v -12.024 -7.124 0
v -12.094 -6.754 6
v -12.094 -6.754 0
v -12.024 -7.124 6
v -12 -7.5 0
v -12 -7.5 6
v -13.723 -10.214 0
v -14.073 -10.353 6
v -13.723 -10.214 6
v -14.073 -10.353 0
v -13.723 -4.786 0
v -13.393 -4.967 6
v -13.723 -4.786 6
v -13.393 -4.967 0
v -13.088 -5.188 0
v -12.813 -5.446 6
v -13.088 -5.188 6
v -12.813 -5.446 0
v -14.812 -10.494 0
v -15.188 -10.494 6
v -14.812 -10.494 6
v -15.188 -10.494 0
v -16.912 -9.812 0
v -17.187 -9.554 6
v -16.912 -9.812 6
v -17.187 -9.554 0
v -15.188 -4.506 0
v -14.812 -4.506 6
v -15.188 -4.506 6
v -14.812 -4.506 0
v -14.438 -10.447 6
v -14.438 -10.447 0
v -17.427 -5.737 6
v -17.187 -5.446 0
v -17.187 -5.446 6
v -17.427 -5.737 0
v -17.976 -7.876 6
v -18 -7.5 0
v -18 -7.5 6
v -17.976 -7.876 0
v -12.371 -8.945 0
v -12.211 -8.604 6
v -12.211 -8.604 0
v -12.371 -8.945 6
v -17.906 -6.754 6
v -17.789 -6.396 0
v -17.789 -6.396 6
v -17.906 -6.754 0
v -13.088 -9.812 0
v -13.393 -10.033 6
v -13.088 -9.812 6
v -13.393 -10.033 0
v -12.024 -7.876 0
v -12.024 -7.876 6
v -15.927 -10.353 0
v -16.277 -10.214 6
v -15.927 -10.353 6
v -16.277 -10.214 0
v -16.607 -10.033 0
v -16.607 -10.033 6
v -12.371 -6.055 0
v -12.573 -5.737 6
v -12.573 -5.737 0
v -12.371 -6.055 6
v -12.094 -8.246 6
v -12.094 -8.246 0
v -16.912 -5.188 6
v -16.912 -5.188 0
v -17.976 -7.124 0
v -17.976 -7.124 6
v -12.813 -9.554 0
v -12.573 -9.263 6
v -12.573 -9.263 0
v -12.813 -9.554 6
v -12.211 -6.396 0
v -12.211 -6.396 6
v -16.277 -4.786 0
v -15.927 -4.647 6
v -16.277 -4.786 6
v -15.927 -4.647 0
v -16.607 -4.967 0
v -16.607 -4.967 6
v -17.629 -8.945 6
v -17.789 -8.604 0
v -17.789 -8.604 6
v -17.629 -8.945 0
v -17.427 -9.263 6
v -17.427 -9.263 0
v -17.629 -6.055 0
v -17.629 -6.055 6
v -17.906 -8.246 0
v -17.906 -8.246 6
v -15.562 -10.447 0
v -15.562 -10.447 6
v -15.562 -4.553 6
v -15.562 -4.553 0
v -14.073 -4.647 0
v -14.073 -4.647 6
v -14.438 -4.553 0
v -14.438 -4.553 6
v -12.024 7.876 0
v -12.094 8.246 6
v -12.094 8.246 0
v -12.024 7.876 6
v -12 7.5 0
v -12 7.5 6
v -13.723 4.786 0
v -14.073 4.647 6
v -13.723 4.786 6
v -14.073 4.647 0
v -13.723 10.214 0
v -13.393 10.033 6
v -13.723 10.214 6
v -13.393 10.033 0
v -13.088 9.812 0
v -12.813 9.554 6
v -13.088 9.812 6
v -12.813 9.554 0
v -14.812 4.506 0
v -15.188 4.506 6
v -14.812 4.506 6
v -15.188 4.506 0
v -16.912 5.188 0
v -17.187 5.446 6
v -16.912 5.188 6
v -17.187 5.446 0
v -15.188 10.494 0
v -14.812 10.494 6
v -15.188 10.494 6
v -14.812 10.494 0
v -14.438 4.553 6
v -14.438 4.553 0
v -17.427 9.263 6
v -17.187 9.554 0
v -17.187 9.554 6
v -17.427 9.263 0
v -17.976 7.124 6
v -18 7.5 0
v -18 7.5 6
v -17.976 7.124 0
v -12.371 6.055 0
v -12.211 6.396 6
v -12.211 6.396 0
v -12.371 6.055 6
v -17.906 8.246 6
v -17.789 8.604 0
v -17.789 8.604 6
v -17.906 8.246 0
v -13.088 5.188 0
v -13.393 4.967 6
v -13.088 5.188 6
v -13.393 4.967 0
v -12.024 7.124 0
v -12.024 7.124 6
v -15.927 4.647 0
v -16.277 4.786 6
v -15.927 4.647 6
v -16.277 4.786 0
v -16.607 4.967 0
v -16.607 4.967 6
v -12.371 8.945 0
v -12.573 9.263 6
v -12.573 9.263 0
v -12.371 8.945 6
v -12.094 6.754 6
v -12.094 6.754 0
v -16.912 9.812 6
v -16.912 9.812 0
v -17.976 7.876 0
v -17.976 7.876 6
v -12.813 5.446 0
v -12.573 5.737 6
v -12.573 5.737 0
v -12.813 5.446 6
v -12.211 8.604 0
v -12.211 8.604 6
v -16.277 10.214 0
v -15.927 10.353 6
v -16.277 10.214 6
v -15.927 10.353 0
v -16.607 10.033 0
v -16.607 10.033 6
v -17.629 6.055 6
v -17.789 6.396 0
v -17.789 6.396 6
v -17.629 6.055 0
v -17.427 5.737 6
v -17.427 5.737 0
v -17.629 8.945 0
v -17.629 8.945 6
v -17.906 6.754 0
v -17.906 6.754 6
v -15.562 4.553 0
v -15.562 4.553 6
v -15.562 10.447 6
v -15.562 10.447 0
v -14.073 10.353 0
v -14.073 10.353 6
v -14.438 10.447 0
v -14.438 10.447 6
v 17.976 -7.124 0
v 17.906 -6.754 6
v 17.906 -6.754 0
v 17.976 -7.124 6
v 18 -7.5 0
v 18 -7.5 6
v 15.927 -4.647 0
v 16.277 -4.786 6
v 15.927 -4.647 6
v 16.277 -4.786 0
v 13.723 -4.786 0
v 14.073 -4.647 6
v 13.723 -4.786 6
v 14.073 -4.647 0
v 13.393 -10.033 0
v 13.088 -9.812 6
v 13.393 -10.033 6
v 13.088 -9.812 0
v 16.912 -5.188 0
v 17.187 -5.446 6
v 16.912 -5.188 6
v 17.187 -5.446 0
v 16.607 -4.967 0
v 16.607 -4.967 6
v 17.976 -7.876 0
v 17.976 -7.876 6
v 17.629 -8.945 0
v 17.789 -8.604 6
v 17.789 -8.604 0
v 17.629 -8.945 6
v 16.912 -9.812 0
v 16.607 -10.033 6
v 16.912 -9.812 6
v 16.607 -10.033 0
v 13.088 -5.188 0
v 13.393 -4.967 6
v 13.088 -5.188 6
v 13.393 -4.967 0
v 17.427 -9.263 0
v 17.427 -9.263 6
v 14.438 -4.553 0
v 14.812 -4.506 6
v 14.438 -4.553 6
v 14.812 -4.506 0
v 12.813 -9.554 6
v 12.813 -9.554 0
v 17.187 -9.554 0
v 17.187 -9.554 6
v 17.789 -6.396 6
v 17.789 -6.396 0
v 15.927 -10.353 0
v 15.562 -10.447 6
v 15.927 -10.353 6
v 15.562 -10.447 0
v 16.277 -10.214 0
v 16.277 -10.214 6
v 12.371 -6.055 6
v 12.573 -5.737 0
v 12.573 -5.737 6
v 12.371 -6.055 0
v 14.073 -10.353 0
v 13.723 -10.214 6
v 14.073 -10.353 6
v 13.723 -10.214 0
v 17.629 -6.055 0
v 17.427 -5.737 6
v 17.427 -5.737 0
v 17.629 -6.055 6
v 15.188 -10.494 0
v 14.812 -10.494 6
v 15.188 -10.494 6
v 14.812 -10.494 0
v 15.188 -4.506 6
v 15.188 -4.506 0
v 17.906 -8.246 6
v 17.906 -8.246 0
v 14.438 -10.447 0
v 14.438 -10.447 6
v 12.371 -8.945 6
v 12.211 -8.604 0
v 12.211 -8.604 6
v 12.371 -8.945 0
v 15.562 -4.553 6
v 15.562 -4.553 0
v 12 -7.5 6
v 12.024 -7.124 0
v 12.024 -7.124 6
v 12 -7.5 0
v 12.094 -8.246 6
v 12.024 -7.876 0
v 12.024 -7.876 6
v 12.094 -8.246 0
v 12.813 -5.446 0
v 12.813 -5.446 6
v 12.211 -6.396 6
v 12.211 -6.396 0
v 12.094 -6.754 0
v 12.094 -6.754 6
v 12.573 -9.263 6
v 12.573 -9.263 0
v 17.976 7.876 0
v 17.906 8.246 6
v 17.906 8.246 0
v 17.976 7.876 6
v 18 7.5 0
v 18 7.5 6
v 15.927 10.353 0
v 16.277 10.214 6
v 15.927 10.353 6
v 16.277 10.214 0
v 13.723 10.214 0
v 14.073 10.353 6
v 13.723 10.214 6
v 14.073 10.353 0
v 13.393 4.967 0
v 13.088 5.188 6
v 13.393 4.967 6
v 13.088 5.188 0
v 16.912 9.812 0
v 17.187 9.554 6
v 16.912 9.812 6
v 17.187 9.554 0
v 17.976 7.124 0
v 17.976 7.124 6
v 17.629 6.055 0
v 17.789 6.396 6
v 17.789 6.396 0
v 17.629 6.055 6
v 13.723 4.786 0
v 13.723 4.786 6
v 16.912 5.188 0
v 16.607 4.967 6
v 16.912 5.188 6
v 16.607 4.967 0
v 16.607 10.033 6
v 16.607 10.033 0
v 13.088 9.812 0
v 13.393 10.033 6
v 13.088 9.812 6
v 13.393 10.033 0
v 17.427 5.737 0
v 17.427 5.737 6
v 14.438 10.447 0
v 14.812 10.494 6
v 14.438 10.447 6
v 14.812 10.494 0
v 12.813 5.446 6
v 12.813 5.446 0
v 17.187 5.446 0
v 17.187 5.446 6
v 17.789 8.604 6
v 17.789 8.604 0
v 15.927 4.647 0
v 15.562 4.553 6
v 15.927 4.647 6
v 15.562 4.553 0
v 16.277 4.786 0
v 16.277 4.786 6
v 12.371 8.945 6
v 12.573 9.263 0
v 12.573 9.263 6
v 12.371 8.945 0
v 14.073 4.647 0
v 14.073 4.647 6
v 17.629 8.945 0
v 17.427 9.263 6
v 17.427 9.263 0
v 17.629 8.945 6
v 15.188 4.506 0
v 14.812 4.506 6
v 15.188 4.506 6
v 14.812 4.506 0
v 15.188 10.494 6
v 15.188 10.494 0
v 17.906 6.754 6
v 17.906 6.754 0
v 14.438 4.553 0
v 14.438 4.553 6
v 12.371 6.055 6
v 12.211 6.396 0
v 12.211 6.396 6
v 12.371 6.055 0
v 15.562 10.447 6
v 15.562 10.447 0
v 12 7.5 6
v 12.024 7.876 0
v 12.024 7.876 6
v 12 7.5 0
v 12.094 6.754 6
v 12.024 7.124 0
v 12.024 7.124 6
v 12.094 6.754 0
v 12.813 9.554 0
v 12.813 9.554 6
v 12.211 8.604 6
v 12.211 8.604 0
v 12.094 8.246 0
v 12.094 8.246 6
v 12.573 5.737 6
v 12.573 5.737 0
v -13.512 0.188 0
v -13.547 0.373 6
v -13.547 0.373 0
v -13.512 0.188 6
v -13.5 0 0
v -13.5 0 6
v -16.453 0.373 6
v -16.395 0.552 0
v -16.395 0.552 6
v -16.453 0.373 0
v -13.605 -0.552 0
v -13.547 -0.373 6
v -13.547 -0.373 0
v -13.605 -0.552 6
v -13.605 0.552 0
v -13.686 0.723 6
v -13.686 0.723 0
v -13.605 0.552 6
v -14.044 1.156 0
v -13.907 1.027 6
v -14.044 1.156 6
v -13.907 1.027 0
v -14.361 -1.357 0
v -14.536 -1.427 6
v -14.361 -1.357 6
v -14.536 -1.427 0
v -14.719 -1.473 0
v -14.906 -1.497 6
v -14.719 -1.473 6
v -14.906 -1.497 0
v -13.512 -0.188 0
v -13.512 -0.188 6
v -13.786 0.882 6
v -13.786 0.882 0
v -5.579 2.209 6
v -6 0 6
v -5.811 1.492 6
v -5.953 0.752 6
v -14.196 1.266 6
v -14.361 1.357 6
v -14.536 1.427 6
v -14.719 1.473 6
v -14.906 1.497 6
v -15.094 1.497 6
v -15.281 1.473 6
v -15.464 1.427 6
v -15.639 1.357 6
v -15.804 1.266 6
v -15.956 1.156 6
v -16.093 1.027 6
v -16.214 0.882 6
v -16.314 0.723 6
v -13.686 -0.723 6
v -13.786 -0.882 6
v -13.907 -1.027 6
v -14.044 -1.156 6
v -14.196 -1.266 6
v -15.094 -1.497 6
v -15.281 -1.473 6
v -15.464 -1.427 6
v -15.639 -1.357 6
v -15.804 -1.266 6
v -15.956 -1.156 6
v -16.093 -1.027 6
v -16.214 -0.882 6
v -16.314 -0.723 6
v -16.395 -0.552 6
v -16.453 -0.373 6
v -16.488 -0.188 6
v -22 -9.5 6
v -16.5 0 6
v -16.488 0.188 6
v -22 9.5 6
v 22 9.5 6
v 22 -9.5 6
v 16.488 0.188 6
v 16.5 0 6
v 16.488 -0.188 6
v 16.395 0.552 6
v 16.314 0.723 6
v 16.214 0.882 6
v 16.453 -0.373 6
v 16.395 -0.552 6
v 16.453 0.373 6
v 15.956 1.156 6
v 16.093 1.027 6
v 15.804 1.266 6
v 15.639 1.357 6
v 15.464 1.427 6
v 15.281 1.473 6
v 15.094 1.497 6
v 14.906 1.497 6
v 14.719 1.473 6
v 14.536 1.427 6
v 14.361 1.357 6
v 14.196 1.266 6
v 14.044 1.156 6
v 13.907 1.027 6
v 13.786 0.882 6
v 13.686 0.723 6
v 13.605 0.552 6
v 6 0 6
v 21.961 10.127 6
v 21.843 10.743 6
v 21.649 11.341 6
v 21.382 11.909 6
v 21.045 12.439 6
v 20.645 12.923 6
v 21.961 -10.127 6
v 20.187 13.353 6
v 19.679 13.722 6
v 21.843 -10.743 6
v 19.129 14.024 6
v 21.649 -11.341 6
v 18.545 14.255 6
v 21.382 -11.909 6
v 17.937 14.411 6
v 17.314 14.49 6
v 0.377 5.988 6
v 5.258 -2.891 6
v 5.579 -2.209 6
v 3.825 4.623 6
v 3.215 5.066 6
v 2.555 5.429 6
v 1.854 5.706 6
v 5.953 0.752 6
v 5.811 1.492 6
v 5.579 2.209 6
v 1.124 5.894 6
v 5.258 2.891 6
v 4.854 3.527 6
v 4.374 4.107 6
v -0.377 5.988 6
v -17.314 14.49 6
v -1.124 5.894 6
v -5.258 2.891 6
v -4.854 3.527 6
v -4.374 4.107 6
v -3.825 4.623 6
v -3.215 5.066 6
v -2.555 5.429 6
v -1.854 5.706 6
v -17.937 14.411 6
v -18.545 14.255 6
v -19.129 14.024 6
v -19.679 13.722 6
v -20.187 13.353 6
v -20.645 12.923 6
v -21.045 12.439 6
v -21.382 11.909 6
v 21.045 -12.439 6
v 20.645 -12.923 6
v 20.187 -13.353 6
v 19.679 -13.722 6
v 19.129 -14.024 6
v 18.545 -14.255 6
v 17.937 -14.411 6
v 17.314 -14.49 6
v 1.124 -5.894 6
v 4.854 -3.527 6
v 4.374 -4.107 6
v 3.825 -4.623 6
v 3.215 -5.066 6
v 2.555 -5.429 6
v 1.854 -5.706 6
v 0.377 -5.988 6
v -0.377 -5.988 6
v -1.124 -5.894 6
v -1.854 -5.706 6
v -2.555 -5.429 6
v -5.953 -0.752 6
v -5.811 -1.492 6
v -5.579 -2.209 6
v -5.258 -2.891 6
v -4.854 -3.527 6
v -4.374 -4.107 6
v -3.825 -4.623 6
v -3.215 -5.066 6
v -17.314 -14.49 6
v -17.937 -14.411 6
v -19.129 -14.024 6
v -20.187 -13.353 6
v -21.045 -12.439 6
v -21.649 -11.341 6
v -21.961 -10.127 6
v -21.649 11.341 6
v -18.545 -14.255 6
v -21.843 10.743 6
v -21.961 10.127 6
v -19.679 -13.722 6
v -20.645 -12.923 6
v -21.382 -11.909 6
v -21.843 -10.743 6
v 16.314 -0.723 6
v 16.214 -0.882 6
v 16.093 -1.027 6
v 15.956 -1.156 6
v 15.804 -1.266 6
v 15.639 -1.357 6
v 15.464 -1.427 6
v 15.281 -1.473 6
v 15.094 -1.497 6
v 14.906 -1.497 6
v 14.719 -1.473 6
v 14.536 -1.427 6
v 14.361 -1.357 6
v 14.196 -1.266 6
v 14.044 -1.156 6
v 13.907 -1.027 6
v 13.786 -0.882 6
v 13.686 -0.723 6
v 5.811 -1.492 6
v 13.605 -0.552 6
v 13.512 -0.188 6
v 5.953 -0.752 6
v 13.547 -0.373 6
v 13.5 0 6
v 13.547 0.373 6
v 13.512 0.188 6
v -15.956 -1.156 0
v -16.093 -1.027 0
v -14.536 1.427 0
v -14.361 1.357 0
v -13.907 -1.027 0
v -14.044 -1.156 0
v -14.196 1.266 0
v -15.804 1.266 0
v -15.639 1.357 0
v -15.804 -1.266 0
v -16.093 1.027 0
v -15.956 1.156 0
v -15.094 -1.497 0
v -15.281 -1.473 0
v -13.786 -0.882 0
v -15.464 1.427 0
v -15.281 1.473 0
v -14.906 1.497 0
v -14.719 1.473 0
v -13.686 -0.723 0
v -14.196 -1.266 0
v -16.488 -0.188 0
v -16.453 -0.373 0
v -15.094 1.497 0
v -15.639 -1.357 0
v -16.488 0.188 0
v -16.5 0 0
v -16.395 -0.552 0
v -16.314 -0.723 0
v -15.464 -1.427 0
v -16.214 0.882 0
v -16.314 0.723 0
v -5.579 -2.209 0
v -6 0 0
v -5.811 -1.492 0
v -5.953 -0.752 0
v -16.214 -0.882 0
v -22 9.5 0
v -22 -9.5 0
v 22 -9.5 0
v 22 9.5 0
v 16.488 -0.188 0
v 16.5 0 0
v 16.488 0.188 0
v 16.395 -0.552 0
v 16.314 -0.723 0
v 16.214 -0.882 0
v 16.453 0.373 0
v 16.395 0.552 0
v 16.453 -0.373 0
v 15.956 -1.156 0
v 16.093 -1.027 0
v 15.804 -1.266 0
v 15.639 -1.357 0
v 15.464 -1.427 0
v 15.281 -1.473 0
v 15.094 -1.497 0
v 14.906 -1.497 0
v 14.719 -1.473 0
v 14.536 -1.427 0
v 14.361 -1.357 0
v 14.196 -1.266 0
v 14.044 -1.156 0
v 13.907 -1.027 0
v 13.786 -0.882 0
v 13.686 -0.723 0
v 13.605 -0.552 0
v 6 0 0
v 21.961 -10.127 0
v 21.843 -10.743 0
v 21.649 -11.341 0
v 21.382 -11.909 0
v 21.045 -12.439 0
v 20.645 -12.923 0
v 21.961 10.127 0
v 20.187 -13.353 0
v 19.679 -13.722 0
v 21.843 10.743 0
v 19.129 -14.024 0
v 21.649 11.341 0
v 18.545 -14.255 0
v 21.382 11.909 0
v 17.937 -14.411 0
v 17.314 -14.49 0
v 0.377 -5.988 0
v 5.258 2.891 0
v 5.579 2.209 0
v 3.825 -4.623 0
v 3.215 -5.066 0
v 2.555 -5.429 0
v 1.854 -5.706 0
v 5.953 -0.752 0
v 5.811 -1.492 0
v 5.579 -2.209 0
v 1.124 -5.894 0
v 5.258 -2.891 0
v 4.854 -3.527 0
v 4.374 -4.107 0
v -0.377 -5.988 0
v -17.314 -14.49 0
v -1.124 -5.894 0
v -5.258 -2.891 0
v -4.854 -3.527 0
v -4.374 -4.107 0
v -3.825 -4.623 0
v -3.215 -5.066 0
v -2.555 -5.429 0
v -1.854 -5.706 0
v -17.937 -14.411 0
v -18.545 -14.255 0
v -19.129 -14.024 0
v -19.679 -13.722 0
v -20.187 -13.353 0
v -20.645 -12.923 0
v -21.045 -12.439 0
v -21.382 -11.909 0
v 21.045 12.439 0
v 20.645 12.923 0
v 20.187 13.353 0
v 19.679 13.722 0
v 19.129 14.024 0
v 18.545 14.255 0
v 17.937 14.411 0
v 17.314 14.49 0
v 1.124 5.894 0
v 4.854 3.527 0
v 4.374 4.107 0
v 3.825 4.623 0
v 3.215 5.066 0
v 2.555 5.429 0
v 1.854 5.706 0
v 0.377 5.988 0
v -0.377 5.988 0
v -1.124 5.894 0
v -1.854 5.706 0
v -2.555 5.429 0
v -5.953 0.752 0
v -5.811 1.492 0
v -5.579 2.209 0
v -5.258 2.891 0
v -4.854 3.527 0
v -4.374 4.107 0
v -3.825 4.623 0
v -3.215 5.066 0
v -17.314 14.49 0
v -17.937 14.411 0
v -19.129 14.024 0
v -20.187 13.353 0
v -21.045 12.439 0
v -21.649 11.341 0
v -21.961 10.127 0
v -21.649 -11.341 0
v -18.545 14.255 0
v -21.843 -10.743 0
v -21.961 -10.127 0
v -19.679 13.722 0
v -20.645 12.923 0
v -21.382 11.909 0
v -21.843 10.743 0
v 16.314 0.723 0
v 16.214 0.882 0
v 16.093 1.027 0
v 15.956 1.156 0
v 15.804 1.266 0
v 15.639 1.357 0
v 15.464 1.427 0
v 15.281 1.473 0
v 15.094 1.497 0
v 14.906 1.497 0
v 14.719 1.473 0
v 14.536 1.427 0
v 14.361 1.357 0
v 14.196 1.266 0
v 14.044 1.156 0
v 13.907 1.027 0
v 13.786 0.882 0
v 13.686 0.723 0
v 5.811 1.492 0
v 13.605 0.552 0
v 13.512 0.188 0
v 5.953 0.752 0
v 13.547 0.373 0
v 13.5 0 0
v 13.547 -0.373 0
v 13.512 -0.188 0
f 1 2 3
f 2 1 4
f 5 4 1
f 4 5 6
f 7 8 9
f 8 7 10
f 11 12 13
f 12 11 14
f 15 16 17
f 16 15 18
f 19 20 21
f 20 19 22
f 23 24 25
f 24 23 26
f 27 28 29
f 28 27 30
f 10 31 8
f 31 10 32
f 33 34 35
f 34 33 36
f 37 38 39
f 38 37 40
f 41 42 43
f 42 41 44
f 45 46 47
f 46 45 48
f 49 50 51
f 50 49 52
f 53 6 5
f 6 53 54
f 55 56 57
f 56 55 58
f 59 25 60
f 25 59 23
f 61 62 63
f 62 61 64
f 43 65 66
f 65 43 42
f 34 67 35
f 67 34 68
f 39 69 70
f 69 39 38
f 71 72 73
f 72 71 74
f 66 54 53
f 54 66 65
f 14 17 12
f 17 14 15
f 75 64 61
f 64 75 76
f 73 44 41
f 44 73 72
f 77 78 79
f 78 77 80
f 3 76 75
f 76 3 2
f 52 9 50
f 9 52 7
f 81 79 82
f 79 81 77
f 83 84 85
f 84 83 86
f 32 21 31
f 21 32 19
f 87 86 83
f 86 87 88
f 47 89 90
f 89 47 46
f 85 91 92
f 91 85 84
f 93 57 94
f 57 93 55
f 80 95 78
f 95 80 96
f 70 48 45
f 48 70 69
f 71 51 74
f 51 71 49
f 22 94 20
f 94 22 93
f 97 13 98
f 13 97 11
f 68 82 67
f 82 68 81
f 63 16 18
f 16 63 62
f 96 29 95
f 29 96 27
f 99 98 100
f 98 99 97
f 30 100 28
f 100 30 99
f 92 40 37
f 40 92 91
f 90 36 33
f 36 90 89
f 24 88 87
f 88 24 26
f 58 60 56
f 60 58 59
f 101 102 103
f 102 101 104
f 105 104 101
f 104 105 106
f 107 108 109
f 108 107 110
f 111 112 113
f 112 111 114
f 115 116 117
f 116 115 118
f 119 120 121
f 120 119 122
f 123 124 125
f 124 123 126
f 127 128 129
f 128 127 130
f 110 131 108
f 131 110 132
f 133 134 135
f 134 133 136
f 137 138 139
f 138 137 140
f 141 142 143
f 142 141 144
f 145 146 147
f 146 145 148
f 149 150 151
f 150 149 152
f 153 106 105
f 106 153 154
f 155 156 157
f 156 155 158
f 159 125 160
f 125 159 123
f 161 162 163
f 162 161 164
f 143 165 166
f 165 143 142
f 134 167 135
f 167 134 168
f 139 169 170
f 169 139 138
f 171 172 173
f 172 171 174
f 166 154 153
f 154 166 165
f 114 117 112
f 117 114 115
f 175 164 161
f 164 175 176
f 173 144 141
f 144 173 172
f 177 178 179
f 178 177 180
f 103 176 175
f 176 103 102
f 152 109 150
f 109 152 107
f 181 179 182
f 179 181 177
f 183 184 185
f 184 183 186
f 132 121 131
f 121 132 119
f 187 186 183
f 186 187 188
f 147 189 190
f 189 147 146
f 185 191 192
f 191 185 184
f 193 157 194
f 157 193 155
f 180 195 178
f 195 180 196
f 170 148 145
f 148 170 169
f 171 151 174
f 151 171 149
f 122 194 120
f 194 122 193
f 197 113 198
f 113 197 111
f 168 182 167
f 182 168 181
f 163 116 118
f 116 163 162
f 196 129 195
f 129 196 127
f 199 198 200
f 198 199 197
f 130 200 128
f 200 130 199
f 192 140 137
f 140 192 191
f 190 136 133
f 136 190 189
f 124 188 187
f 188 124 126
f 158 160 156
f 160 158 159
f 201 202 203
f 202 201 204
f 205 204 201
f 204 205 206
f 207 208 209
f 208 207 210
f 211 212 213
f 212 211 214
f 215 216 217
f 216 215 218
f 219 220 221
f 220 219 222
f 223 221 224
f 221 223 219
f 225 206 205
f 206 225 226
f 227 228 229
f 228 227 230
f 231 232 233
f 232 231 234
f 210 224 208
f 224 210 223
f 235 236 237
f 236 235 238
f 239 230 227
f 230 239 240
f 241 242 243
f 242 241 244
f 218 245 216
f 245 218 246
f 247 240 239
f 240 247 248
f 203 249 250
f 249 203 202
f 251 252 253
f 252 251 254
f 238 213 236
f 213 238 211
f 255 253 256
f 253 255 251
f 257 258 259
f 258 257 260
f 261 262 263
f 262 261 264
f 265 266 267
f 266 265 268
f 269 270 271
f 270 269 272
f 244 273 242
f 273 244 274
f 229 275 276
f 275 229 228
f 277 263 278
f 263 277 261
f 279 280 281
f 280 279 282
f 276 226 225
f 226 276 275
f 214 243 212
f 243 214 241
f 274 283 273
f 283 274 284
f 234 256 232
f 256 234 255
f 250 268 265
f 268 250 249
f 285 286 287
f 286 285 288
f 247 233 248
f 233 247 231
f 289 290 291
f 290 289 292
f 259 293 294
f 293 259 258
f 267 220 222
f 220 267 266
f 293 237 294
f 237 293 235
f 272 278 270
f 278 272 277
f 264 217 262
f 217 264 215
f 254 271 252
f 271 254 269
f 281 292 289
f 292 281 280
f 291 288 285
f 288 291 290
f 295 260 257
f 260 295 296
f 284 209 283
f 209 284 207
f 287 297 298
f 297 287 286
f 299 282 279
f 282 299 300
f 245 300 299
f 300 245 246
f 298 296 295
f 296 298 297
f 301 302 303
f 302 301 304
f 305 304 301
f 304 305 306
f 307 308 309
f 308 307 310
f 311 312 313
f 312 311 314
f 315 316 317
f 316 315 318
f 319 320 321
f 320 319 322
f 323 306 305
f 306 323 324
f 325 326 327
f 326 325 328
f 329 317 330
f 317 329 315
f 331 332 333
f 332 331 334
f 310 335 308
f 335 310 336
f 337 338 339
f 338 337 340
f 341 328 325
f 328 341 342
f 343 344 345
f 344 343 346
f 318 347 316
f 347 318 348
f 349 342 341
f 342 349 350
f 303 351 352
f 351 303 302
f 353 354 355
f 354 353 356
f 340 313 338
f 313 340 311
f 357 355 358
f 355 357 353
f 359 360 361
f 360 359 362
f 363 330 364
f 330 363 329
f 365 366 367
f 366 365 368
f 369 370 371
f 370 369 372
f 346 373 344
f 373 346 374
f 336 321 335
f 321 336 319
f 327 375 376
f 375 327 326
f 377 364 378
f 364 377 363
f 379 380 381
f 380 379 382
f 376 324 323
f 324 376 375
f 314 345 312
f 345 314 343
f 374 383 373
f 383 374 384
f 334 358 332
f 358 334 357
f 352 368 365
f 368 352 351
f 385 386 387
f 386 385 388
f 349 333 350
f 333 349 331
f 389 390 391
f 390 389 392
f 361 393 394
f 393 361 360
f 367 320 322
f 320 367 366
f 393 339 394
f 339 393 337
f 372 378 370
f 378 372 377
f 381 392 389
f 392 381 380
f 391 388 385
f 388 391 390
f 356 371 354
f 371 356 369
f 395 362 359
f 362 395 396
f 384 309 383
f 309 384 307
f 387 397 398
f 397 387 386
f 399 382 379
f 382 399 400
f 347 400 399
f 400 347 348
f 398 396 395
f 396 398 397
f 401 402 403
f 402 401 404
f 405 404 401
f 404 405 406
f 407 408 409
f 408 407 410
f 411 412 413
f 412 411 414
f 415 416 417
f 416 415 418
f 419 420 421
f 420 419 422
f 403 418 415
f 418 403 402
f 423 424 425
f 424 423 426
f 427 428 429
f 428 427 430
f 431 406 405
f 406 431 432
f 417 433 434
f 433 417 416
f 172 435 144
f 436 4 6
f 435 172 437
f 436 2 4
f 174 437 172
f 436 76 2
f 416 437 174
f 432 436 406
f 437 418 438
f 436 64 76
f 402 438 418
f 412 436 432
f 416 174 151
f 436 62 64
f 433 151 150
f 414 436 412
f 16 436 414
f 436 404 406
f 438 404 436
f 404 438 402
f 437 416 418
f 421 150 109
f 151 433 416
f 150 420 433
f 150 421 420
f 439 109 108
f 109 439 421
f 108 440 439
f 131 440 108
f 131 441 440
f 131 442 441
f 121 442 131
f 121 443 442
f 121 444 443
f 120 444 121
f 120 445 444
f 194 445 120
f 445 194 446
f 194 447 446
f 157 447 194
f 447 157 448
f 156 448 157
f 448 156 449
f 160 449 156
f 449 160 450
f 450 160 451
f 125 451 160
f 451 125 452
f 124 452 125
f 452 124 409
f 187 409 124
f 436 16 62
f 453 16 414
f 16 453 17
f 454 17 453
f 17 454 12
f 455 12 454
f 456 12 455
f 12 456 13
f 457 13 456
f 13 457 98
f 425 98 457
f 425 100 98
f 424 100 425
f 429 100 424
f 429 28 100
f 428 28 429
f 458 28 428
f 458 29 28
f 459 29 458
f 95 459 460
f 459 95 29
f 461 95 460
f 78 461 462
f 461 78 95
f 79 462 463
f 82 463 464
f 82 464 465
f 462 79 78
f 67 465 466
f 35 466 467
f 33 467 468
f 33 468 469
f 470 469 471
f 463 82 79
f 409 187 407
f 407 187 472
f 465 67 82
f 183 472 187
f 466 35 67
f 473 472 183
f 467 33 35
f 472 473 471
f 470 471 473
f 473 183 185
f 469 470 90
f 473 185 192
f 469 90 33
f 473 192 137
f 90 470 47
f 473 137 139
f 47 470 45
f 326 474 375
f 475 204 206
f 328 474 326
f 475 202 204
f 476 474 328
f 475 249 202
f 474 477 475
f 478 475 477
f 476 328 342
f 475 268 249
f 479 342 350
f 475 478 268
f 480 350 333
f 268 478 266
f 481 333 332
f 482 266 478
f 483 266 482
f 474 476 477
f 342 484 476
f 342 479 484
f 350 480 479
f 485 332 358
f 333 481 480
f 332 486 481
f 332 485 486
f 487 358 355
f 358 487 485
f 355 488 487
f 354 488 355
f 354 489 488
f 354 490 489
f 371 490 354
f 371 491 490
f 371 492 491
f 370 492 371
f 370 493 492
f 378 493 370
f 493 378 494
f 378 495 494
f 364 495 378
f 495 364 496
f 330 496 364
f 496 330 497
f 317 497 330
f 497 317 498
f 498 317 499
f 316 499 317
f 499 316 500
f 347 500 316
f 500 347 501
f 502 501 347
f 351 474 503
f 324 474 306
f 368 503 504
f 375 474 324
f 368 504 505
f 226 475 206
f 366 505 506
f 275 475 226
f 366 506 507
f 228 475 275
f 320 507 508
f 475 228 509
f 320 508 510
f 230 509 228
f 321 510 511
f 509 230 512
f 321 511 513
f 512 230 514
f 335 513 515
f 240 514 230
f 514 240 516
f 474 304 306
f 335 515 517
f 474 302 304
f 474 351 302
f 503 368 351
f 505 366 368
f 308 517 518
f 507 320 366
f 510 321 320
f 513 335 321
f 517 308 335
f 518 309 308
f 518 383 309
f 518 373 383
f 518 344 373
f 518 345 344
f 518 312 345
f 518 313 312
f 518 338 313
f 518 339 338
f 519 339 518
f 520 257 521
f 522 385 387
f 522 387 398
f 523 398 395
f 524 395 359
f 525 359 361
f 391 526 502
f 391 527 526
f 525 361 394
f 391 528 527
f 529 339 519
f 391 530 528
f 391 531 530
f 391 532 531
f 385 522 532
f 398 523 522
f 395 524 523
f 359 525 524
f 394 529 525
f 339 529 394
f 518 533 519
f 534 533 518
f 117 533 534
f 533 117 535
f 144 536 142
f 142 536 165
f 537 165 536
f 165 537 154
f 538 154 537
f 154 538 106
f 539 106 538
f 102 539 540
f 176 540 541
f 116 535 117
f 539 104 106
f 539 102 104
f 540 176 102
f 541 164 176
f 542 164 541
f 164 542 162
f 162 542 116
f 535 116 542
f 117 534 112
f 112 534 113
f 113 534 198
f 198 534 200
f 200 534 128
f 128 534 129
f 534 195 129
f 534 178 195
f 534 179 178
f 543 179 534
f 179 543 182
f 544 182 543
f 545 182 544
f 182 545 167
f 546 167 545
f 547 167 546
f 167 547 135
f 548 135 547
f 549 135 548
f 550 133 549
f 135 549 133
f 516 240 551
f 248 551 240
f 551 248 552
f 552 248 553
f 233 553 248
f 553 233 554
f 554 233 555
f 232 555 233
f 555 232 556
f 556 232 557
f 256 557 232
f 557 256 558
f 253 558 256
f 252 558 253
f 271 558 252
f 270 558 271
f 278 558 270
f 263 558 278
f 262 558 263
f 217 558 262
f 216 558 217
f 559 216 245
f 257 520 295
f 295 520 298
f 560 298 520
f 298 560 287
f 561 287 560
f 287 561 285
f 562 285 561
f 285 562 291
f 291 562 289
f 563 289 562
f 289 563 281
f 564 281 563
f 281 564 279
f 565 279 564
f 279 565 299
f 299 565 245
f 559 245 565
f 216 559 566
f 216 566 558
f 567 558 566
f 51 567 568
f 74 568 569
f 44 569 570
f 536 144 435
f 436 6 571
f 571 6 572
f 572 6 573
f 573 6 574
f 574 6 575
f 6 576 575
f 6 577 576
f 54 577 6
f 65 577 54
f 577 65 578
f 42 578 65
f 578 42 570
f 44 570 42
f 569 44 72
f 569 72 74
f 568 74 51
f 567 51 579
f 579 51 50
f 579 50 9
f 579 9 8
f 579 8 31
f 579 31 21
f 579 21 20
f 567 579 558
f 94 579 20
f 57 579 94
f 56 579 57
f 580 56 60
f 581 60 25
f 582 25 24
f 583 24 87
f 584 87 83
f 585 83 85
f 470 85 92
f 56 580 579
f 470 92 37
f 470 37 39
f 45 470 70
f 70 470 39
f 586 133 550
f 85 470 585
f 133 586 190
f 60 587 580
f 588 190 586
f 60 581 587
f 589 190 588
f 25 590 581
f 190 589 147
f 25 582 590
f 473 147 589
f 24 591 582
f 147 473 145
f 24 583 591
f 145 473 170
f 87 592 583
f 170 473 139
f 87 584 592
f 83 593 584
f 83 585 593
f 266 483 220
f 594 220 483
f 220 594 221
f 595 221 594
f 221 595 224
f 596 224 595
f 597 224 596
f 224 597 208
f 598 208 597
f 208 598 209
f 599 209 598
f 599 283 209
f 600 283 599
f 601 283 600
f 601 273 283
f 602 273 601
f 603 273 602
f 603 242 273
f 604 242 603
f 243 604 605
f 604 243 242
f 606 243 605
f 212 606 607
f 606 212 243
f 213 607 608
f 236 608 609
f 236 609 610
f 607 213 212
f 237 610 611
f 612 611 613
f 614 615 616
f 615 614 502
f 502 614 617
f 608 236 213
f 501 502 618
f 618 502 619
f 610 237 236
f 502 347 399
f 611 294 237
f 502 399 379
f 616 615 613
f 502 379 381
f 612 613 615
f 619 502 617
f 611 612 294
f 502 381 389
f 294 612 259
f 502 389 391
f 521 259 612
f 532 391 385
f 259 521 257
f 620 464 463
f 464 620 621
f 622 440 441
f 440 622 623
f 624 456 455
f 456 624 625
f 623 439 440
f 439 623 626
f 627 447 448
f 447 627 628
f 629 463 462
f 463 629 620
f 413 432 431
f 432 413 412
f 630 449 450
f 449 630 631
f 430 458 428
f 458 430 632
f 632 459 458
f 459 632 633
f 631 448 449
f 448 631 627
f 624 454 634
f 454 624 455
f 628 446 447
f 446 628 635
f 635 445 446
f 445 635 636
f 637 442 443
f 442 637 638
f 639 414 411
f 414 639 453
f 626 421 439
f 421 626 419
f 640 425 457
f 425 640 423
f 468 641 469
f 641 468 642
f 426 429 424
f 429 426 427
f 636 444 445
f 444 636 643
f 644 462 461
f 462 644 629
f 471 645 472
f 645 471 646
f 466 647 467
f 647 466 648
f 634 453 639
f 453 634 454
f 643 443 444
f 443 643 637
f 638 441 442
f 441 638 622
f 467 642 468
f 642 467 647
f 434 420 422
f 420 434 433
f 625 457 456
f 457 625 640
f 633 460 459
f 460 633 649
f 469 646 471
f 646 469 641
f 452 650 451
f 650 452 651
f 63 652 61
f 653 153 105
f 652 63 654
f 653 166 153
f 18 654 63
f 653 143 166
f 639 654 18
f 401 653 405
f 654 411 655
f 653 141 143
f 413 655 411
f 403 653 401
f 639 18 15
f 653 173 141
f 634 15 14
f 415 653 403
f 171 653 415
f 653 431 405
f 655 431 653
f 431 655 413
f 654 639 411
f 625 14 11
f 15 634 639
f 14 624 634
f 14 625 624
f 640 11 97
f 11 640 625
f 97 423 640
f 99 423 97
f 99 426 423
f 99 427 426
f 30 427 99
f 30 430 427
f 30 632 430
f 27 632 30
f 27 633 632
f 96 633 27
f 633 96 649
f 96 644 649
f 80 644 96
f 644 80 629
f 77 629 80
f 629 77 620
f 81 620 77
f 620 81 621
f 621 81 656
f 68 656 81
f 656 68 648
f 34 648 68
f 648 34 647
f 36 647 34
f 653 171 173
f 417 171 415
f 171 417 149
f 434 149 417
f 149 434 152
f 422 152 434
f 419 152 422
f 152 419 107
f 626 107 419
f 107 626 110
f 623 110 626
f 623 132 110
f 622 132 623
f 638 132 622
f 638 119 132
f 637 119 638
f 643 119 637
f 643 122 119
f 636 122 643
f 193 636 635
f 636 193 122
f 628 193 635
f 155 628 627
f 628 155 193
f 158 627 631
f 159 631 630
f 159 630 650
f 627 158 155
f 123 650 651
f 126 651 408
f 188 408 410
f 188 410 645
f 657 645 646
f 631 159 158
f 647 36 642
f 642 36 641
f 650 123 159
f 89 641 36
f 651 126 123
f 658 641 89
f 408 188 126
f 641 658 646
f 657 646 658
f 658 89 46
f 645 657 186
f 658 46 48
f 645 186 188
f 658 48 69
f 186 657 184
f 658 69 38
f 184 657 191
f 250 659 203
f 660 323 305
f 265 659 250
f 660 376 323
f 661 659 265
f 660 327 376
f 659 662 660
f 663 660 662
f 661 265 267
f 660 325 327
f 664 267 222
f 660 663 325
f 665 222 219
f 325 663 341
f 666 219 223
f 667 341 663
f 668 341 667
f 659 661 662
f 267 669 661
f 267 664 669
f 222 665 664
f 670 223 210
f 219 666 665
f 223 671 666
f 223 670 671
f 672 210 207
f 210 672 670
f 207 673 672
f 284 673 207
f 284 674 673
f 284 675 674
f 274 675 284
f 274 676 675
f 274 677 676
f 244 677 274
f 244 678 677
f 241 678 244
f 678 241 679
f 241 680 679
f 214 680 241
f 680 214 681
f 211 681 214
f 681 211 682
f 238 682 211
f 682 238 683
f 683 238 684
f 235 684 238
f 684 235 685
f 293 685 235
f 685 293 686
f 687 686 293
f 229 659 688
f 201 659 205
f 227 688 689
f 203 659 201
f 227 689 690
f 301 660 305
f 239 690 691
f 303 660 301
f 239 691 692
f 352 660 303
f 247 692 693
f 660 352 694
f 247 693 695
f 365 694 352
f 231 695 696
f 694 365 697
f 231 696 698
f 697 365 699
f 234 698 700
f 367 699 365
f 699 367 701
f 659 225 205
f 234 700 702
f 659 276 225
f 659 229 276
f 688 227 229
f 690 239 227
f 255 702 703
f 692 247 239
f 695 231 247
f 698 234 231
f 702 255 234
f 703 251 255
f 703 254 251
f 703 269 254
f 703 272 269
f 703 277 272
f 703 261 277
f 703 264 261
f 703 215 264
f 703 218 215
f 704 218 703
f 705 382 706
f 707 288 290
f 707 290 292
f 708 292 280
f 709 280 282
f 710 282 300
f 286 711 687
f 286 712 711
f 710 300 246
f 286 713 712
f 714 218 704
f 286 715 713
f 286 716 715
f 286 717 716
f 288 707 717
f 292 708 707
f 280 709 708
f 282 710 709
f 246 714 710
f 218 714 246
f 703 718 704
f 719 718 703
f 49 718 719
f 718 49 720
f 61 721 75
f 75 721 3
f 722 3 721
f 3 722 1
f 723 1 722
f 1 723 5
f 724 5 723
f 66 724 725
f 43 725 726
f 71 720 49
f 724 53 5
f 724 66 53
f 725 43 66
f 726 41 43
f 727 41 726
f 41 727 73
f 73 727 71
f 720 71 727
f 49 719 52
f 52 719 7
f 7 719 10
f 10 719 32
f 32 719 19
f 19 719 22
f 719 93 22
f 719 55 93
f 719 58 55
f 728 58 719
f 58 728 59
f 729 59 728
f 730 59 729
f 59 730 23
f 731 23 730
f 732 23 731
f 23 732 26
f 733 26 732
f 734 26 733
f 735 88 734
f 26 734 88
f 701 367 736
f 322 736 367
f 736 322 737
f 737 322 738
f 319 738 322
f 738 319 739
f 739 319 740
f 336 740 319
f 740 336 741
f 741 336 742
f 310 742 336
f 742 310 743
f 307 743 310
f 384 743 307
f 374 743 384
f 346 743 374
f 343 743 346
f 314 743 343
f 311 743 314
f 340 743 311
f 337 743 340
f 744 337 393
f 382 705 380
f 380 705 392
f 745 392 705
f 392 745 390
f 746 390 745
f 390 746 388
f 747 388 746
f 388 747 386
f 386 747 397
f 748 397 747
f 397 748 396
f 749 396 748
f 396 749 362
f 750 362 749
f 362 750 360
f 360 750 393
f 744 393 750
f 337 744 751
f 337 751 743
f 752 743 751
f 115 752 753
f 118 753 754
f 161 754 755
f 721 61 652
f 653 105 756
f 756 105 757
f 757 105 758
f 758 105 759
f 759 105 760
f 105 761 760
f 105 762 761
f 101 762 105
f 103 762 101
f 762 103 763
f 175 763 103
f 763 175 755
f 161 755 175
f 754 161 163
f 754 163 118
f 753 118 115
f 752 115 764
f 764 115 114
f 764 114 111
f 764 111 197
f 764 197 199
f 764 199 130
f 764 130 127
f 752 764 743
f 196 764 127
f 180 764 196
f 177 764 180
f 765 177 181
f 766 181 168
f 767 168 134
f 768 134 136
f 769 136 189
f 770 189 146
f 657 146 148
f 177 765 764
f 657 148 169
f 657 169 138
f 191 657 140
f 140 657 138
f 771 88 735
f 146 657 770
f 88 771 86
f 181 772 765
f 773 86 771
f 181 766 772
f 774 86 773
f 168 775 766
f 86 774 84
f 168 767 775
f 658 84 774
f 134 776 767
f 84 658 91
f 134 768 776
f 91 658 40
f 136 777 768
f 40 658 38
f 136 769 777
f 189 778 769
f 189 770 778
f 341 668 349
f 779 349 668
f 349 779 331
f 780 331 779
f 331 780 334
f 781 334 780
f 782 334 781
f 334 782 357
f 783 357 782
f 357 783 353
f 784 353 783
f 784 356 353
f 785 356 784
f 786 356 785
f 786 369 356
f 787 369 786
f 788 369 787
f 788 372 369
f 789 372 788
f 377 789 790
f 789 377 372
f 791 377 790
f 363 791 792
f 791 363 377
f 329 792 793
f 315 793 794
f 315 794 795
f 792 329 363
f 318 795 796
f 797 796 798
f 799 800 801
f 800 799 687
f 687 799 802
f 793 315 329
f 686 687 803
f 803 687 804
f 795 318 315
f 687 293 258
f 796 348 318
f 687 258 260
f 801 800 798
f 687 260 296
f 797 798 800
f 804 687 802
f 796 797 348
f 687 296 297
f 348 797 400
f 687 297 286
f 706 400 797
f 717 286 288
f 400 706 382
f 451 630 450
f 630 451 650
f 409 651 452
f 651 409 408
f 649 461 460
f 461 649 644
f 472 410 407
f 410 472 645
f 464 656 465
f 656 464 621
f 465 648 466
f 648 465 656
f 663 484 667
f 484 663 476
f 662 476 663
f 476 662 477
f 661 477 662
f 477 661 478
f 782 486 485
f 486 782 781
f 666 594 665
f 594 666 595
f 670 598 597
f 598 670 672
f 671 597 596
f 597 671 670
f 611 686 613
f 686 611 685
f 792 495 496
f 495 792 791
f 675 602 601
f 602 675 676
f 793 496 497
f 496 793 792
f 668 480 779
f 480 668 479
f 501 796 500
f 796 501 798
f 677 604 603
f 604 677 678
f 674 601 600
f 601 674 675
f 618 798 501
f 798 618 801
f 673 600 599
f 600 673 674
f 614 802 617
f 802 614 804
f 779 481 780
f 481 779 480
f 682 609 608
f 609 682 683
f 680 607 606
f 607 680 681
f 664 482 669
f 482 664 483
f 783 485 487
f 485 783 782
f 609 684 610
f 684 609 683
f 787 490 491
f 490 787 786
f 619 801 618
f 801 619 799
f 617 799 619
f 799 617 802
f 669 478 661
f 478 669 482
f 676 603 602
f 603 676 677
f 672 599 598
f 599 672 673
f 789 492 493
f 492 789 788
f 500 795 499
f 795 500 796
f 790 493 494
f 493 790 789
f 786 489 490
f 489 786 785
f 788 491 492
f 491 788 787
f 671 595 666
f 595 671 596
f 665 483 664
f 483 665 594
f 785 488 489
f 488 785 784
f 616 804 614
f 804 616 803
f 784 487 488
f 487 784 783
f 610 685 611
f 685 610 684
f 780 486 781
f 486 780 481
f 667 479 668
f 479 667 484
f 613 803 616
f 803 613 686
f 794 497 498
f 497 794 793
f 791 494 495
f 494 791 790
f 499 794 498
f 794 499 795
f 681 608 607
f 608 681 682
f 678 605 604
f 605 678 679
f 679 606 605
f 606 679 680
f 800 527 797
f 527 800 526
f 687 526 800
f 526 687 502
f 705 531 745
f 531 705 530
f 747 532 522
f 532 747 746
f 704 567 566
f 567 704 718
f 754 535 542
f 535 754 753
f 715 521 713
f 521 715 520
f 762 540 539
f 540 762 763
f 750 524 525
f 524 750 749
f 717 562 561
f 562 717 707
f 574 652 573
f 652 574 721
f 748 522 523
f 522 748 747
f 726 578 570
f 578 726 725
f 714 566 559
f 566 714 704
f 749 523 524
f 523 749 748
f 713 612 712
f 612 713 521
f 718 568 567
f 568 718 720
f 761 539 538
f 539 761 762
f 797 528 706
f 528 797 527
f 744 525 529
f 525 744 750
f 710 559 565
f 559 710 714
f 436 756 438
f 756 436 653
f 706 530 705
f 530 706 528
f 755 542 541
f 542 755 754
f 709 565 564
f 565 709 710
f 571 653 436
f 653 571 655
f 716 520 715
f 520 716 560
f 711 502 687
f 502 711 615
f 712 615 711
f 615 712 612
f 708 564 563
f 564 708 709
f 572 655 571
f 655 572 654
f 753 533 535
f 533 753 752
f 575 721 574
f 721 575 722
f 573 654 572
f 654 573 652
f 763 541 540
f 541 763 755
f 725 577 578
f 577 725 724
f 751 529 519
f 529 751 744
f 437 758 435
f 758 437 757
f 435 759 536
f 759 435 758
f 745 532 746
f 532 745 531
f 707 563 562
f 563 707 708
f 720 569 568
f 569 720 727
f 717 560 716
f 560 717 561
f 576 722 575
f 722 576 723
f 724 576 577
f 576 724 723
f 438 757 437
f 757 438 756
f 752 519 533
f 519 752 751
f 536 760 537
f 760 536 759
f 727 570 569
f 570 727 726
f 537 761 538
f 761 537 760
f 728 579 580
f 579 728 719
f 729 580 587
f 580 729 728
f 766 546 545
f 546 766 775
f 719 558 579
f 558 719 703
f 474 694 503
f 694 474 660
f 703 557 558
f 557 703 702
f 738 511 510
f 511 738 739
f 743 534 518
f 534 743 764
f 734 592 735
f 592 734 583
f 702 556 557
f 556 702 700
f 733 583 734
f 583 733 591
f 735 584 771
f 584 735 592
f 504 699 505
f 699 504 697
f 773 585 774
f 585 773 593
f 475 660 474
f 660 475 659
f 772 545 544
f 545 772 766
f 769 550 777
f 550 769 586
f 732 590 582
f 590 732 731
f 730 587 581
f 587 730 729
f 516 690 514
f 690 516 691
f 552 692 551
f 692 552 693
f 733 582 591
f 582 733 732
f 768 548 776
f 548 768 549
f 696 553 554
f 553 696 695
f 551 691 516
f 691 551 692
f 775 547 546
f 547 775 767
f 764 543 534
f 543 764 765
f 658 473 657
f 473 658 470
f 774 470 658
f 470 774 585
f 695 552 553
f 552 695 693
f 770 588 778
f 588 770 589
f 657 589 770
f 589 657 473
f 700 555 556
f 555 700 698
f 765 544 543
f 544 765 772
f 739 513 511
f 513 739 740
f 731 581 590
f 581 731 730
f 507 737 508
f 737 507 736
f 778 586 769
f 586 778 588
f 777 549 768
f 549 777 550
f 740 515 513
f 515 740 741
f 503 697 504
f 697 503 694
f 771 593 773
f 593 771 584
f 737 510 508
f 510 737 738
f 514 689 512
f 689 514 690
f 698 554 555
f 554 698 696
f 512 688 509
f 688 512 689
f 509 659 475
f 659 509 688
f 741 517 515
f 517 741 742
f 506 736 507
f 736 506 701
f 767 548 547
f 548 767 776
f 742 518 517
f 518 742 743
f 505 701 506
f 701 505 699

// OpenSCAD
$fn = 50;


difference() {
	union() {
		hull() {
			translate(v = [-17.0000000000, 9.5000000000, 0]) {
				cylinder(h = 6, r = 5);
			}
			translate(v = [17.0000000000, 9.5000000000, 0]) {
				cylinder(h = 6, r = 5);
			}
			translate(v = [-17.0000000000, -9.5000000000, 0]) {
				cylinder(h = 6, r = 5);
			}
			translate(v = [17.0000000000, -9.5000000000, 0]) {
				cylinder(h = 6, r = 5);
			}
		}
	}
	union() {
		#translate(v = [-15.0000000000, -7.5000000000, 0]) {
			cylinder(h = 6, r = 3.0000000000);
		}
		#translate(v = [-15.0000000000, 7.5000000000, 0]) {
			cylinder(h = 6, r = 3.0000000000);
		}
		#translate(v = [15.0000000000, -7.5000000000, 0]) {
			cylinder(h = 6, r = 3.0000000000);
		}
		#translate(v = [15.0000000000, 7.5000000000, 0]) {
			cylinder(h = 6, r = 3.0000000000);
		}
		#translate(v = [-15.0000000000, -7.5000000000, -100.0000000000]) {
			cylinder(h = 200, r = 3.0000000000);
		}
		#translate(v = [-15.0000000000, 7.5000000000, -100.0000000000]) {
			cylinder(h = 200, r = 3.0000000000);
		}
		#translate(v = [15.0000000000, -7.5000000000, -100.0000000000]) {
			cylinder(h = 200, r = 3.0000000000);
		}
		#translate(v = [15.0000000000, 7.5000000000, -100.0000000000]) {
			cylinder(h = 200, r = 3.0000000000);
		}
		#translate(v = [-15.0000000000, -7.5000000000, 0]) {
			cylinder(h = 6, r = 1.5000000000);
		}
		#translate(v = [-15.0000000000, 0.0000000000, 0]) {
			cylinder(h = 6, r = 1.5000000000);
		}
		#translate(v = [-15.0000000000, 7.5000000000, 0]) {
			cylinder(h = 6, r = 1.5000000000);
		}
		#translate(v = [15.0000000000, -7.5000000000, 0]) {
			cylinder(h = 6, r = 1.5000000000);
		}
		#translate(v = [15.0000000000, 0.0000000000, 0]) {
			cylinder(h = 6, r = 1.5000000000);
		}
		#translate(v = [15.0000000000, 7.5000000000, 0]) {
			cylinder(h = 6, r = 1.5000000000);
		}
		#translate(v = [-15.0000000000, -7.5000000000, 0]) {
			cylinder(h = 6, r = 1.5000000000);
		}
		#translate(v = [-15.0000000000, 0.0000000000, 0]) {
			cylinder(h = 6, r = 1.5000000000);
		}
		#translate(v = [-15.0000000000, 7.5000000000, 0]) {
			cylinder(h = 6, r = 1.5000000000);
		}
		#translate(v = [15.0000000000, -7.5000000000, 0]) {
			cylinder(h = 6, r = 1.5000000000);
		}
		#translate(v = [15.0000000000, 0.0000000000, 0]) {
			cylinder(h = 6, r = 1.5000000000);
		}
		#translate(v = [15.0000000000, 7.5000000000, 0]) {
			cylinder(h = 6, r = 1.5000000000);
		}
		#translate(v = [-15.0000000000, -7.5000000000, 0]) {
			cylinder(h = 6, r = 1.5000000000);
		}
		#translate(v = [-15.0000000000, 0.0000000000, 0]) {
			cylinder(h = 6, r = 1.5000000000);
		}
		#translate(v = [-15.0000000000, 7.5000000000, 0]) {
			cylinder(h = 6, r = 1.5000000000);
		}
		#translate(v = [15.0000000000, -7.5000000000, 0]) {
			cylinder(h = 6, r = 1.5000000000);
		}
		#translate(v = [15.0000000000, 0.0000000000, 0]) {
			cylinder(h = 6, r = 1.5000000000);
		}
		#translate(v = [15.0000000000, 7.5000000000, 0]) {
			cylinder(h = 6, r = 1.5000000000);
		}
		#cylinder(h = 6, r = 6.0000000000);
	}
}
